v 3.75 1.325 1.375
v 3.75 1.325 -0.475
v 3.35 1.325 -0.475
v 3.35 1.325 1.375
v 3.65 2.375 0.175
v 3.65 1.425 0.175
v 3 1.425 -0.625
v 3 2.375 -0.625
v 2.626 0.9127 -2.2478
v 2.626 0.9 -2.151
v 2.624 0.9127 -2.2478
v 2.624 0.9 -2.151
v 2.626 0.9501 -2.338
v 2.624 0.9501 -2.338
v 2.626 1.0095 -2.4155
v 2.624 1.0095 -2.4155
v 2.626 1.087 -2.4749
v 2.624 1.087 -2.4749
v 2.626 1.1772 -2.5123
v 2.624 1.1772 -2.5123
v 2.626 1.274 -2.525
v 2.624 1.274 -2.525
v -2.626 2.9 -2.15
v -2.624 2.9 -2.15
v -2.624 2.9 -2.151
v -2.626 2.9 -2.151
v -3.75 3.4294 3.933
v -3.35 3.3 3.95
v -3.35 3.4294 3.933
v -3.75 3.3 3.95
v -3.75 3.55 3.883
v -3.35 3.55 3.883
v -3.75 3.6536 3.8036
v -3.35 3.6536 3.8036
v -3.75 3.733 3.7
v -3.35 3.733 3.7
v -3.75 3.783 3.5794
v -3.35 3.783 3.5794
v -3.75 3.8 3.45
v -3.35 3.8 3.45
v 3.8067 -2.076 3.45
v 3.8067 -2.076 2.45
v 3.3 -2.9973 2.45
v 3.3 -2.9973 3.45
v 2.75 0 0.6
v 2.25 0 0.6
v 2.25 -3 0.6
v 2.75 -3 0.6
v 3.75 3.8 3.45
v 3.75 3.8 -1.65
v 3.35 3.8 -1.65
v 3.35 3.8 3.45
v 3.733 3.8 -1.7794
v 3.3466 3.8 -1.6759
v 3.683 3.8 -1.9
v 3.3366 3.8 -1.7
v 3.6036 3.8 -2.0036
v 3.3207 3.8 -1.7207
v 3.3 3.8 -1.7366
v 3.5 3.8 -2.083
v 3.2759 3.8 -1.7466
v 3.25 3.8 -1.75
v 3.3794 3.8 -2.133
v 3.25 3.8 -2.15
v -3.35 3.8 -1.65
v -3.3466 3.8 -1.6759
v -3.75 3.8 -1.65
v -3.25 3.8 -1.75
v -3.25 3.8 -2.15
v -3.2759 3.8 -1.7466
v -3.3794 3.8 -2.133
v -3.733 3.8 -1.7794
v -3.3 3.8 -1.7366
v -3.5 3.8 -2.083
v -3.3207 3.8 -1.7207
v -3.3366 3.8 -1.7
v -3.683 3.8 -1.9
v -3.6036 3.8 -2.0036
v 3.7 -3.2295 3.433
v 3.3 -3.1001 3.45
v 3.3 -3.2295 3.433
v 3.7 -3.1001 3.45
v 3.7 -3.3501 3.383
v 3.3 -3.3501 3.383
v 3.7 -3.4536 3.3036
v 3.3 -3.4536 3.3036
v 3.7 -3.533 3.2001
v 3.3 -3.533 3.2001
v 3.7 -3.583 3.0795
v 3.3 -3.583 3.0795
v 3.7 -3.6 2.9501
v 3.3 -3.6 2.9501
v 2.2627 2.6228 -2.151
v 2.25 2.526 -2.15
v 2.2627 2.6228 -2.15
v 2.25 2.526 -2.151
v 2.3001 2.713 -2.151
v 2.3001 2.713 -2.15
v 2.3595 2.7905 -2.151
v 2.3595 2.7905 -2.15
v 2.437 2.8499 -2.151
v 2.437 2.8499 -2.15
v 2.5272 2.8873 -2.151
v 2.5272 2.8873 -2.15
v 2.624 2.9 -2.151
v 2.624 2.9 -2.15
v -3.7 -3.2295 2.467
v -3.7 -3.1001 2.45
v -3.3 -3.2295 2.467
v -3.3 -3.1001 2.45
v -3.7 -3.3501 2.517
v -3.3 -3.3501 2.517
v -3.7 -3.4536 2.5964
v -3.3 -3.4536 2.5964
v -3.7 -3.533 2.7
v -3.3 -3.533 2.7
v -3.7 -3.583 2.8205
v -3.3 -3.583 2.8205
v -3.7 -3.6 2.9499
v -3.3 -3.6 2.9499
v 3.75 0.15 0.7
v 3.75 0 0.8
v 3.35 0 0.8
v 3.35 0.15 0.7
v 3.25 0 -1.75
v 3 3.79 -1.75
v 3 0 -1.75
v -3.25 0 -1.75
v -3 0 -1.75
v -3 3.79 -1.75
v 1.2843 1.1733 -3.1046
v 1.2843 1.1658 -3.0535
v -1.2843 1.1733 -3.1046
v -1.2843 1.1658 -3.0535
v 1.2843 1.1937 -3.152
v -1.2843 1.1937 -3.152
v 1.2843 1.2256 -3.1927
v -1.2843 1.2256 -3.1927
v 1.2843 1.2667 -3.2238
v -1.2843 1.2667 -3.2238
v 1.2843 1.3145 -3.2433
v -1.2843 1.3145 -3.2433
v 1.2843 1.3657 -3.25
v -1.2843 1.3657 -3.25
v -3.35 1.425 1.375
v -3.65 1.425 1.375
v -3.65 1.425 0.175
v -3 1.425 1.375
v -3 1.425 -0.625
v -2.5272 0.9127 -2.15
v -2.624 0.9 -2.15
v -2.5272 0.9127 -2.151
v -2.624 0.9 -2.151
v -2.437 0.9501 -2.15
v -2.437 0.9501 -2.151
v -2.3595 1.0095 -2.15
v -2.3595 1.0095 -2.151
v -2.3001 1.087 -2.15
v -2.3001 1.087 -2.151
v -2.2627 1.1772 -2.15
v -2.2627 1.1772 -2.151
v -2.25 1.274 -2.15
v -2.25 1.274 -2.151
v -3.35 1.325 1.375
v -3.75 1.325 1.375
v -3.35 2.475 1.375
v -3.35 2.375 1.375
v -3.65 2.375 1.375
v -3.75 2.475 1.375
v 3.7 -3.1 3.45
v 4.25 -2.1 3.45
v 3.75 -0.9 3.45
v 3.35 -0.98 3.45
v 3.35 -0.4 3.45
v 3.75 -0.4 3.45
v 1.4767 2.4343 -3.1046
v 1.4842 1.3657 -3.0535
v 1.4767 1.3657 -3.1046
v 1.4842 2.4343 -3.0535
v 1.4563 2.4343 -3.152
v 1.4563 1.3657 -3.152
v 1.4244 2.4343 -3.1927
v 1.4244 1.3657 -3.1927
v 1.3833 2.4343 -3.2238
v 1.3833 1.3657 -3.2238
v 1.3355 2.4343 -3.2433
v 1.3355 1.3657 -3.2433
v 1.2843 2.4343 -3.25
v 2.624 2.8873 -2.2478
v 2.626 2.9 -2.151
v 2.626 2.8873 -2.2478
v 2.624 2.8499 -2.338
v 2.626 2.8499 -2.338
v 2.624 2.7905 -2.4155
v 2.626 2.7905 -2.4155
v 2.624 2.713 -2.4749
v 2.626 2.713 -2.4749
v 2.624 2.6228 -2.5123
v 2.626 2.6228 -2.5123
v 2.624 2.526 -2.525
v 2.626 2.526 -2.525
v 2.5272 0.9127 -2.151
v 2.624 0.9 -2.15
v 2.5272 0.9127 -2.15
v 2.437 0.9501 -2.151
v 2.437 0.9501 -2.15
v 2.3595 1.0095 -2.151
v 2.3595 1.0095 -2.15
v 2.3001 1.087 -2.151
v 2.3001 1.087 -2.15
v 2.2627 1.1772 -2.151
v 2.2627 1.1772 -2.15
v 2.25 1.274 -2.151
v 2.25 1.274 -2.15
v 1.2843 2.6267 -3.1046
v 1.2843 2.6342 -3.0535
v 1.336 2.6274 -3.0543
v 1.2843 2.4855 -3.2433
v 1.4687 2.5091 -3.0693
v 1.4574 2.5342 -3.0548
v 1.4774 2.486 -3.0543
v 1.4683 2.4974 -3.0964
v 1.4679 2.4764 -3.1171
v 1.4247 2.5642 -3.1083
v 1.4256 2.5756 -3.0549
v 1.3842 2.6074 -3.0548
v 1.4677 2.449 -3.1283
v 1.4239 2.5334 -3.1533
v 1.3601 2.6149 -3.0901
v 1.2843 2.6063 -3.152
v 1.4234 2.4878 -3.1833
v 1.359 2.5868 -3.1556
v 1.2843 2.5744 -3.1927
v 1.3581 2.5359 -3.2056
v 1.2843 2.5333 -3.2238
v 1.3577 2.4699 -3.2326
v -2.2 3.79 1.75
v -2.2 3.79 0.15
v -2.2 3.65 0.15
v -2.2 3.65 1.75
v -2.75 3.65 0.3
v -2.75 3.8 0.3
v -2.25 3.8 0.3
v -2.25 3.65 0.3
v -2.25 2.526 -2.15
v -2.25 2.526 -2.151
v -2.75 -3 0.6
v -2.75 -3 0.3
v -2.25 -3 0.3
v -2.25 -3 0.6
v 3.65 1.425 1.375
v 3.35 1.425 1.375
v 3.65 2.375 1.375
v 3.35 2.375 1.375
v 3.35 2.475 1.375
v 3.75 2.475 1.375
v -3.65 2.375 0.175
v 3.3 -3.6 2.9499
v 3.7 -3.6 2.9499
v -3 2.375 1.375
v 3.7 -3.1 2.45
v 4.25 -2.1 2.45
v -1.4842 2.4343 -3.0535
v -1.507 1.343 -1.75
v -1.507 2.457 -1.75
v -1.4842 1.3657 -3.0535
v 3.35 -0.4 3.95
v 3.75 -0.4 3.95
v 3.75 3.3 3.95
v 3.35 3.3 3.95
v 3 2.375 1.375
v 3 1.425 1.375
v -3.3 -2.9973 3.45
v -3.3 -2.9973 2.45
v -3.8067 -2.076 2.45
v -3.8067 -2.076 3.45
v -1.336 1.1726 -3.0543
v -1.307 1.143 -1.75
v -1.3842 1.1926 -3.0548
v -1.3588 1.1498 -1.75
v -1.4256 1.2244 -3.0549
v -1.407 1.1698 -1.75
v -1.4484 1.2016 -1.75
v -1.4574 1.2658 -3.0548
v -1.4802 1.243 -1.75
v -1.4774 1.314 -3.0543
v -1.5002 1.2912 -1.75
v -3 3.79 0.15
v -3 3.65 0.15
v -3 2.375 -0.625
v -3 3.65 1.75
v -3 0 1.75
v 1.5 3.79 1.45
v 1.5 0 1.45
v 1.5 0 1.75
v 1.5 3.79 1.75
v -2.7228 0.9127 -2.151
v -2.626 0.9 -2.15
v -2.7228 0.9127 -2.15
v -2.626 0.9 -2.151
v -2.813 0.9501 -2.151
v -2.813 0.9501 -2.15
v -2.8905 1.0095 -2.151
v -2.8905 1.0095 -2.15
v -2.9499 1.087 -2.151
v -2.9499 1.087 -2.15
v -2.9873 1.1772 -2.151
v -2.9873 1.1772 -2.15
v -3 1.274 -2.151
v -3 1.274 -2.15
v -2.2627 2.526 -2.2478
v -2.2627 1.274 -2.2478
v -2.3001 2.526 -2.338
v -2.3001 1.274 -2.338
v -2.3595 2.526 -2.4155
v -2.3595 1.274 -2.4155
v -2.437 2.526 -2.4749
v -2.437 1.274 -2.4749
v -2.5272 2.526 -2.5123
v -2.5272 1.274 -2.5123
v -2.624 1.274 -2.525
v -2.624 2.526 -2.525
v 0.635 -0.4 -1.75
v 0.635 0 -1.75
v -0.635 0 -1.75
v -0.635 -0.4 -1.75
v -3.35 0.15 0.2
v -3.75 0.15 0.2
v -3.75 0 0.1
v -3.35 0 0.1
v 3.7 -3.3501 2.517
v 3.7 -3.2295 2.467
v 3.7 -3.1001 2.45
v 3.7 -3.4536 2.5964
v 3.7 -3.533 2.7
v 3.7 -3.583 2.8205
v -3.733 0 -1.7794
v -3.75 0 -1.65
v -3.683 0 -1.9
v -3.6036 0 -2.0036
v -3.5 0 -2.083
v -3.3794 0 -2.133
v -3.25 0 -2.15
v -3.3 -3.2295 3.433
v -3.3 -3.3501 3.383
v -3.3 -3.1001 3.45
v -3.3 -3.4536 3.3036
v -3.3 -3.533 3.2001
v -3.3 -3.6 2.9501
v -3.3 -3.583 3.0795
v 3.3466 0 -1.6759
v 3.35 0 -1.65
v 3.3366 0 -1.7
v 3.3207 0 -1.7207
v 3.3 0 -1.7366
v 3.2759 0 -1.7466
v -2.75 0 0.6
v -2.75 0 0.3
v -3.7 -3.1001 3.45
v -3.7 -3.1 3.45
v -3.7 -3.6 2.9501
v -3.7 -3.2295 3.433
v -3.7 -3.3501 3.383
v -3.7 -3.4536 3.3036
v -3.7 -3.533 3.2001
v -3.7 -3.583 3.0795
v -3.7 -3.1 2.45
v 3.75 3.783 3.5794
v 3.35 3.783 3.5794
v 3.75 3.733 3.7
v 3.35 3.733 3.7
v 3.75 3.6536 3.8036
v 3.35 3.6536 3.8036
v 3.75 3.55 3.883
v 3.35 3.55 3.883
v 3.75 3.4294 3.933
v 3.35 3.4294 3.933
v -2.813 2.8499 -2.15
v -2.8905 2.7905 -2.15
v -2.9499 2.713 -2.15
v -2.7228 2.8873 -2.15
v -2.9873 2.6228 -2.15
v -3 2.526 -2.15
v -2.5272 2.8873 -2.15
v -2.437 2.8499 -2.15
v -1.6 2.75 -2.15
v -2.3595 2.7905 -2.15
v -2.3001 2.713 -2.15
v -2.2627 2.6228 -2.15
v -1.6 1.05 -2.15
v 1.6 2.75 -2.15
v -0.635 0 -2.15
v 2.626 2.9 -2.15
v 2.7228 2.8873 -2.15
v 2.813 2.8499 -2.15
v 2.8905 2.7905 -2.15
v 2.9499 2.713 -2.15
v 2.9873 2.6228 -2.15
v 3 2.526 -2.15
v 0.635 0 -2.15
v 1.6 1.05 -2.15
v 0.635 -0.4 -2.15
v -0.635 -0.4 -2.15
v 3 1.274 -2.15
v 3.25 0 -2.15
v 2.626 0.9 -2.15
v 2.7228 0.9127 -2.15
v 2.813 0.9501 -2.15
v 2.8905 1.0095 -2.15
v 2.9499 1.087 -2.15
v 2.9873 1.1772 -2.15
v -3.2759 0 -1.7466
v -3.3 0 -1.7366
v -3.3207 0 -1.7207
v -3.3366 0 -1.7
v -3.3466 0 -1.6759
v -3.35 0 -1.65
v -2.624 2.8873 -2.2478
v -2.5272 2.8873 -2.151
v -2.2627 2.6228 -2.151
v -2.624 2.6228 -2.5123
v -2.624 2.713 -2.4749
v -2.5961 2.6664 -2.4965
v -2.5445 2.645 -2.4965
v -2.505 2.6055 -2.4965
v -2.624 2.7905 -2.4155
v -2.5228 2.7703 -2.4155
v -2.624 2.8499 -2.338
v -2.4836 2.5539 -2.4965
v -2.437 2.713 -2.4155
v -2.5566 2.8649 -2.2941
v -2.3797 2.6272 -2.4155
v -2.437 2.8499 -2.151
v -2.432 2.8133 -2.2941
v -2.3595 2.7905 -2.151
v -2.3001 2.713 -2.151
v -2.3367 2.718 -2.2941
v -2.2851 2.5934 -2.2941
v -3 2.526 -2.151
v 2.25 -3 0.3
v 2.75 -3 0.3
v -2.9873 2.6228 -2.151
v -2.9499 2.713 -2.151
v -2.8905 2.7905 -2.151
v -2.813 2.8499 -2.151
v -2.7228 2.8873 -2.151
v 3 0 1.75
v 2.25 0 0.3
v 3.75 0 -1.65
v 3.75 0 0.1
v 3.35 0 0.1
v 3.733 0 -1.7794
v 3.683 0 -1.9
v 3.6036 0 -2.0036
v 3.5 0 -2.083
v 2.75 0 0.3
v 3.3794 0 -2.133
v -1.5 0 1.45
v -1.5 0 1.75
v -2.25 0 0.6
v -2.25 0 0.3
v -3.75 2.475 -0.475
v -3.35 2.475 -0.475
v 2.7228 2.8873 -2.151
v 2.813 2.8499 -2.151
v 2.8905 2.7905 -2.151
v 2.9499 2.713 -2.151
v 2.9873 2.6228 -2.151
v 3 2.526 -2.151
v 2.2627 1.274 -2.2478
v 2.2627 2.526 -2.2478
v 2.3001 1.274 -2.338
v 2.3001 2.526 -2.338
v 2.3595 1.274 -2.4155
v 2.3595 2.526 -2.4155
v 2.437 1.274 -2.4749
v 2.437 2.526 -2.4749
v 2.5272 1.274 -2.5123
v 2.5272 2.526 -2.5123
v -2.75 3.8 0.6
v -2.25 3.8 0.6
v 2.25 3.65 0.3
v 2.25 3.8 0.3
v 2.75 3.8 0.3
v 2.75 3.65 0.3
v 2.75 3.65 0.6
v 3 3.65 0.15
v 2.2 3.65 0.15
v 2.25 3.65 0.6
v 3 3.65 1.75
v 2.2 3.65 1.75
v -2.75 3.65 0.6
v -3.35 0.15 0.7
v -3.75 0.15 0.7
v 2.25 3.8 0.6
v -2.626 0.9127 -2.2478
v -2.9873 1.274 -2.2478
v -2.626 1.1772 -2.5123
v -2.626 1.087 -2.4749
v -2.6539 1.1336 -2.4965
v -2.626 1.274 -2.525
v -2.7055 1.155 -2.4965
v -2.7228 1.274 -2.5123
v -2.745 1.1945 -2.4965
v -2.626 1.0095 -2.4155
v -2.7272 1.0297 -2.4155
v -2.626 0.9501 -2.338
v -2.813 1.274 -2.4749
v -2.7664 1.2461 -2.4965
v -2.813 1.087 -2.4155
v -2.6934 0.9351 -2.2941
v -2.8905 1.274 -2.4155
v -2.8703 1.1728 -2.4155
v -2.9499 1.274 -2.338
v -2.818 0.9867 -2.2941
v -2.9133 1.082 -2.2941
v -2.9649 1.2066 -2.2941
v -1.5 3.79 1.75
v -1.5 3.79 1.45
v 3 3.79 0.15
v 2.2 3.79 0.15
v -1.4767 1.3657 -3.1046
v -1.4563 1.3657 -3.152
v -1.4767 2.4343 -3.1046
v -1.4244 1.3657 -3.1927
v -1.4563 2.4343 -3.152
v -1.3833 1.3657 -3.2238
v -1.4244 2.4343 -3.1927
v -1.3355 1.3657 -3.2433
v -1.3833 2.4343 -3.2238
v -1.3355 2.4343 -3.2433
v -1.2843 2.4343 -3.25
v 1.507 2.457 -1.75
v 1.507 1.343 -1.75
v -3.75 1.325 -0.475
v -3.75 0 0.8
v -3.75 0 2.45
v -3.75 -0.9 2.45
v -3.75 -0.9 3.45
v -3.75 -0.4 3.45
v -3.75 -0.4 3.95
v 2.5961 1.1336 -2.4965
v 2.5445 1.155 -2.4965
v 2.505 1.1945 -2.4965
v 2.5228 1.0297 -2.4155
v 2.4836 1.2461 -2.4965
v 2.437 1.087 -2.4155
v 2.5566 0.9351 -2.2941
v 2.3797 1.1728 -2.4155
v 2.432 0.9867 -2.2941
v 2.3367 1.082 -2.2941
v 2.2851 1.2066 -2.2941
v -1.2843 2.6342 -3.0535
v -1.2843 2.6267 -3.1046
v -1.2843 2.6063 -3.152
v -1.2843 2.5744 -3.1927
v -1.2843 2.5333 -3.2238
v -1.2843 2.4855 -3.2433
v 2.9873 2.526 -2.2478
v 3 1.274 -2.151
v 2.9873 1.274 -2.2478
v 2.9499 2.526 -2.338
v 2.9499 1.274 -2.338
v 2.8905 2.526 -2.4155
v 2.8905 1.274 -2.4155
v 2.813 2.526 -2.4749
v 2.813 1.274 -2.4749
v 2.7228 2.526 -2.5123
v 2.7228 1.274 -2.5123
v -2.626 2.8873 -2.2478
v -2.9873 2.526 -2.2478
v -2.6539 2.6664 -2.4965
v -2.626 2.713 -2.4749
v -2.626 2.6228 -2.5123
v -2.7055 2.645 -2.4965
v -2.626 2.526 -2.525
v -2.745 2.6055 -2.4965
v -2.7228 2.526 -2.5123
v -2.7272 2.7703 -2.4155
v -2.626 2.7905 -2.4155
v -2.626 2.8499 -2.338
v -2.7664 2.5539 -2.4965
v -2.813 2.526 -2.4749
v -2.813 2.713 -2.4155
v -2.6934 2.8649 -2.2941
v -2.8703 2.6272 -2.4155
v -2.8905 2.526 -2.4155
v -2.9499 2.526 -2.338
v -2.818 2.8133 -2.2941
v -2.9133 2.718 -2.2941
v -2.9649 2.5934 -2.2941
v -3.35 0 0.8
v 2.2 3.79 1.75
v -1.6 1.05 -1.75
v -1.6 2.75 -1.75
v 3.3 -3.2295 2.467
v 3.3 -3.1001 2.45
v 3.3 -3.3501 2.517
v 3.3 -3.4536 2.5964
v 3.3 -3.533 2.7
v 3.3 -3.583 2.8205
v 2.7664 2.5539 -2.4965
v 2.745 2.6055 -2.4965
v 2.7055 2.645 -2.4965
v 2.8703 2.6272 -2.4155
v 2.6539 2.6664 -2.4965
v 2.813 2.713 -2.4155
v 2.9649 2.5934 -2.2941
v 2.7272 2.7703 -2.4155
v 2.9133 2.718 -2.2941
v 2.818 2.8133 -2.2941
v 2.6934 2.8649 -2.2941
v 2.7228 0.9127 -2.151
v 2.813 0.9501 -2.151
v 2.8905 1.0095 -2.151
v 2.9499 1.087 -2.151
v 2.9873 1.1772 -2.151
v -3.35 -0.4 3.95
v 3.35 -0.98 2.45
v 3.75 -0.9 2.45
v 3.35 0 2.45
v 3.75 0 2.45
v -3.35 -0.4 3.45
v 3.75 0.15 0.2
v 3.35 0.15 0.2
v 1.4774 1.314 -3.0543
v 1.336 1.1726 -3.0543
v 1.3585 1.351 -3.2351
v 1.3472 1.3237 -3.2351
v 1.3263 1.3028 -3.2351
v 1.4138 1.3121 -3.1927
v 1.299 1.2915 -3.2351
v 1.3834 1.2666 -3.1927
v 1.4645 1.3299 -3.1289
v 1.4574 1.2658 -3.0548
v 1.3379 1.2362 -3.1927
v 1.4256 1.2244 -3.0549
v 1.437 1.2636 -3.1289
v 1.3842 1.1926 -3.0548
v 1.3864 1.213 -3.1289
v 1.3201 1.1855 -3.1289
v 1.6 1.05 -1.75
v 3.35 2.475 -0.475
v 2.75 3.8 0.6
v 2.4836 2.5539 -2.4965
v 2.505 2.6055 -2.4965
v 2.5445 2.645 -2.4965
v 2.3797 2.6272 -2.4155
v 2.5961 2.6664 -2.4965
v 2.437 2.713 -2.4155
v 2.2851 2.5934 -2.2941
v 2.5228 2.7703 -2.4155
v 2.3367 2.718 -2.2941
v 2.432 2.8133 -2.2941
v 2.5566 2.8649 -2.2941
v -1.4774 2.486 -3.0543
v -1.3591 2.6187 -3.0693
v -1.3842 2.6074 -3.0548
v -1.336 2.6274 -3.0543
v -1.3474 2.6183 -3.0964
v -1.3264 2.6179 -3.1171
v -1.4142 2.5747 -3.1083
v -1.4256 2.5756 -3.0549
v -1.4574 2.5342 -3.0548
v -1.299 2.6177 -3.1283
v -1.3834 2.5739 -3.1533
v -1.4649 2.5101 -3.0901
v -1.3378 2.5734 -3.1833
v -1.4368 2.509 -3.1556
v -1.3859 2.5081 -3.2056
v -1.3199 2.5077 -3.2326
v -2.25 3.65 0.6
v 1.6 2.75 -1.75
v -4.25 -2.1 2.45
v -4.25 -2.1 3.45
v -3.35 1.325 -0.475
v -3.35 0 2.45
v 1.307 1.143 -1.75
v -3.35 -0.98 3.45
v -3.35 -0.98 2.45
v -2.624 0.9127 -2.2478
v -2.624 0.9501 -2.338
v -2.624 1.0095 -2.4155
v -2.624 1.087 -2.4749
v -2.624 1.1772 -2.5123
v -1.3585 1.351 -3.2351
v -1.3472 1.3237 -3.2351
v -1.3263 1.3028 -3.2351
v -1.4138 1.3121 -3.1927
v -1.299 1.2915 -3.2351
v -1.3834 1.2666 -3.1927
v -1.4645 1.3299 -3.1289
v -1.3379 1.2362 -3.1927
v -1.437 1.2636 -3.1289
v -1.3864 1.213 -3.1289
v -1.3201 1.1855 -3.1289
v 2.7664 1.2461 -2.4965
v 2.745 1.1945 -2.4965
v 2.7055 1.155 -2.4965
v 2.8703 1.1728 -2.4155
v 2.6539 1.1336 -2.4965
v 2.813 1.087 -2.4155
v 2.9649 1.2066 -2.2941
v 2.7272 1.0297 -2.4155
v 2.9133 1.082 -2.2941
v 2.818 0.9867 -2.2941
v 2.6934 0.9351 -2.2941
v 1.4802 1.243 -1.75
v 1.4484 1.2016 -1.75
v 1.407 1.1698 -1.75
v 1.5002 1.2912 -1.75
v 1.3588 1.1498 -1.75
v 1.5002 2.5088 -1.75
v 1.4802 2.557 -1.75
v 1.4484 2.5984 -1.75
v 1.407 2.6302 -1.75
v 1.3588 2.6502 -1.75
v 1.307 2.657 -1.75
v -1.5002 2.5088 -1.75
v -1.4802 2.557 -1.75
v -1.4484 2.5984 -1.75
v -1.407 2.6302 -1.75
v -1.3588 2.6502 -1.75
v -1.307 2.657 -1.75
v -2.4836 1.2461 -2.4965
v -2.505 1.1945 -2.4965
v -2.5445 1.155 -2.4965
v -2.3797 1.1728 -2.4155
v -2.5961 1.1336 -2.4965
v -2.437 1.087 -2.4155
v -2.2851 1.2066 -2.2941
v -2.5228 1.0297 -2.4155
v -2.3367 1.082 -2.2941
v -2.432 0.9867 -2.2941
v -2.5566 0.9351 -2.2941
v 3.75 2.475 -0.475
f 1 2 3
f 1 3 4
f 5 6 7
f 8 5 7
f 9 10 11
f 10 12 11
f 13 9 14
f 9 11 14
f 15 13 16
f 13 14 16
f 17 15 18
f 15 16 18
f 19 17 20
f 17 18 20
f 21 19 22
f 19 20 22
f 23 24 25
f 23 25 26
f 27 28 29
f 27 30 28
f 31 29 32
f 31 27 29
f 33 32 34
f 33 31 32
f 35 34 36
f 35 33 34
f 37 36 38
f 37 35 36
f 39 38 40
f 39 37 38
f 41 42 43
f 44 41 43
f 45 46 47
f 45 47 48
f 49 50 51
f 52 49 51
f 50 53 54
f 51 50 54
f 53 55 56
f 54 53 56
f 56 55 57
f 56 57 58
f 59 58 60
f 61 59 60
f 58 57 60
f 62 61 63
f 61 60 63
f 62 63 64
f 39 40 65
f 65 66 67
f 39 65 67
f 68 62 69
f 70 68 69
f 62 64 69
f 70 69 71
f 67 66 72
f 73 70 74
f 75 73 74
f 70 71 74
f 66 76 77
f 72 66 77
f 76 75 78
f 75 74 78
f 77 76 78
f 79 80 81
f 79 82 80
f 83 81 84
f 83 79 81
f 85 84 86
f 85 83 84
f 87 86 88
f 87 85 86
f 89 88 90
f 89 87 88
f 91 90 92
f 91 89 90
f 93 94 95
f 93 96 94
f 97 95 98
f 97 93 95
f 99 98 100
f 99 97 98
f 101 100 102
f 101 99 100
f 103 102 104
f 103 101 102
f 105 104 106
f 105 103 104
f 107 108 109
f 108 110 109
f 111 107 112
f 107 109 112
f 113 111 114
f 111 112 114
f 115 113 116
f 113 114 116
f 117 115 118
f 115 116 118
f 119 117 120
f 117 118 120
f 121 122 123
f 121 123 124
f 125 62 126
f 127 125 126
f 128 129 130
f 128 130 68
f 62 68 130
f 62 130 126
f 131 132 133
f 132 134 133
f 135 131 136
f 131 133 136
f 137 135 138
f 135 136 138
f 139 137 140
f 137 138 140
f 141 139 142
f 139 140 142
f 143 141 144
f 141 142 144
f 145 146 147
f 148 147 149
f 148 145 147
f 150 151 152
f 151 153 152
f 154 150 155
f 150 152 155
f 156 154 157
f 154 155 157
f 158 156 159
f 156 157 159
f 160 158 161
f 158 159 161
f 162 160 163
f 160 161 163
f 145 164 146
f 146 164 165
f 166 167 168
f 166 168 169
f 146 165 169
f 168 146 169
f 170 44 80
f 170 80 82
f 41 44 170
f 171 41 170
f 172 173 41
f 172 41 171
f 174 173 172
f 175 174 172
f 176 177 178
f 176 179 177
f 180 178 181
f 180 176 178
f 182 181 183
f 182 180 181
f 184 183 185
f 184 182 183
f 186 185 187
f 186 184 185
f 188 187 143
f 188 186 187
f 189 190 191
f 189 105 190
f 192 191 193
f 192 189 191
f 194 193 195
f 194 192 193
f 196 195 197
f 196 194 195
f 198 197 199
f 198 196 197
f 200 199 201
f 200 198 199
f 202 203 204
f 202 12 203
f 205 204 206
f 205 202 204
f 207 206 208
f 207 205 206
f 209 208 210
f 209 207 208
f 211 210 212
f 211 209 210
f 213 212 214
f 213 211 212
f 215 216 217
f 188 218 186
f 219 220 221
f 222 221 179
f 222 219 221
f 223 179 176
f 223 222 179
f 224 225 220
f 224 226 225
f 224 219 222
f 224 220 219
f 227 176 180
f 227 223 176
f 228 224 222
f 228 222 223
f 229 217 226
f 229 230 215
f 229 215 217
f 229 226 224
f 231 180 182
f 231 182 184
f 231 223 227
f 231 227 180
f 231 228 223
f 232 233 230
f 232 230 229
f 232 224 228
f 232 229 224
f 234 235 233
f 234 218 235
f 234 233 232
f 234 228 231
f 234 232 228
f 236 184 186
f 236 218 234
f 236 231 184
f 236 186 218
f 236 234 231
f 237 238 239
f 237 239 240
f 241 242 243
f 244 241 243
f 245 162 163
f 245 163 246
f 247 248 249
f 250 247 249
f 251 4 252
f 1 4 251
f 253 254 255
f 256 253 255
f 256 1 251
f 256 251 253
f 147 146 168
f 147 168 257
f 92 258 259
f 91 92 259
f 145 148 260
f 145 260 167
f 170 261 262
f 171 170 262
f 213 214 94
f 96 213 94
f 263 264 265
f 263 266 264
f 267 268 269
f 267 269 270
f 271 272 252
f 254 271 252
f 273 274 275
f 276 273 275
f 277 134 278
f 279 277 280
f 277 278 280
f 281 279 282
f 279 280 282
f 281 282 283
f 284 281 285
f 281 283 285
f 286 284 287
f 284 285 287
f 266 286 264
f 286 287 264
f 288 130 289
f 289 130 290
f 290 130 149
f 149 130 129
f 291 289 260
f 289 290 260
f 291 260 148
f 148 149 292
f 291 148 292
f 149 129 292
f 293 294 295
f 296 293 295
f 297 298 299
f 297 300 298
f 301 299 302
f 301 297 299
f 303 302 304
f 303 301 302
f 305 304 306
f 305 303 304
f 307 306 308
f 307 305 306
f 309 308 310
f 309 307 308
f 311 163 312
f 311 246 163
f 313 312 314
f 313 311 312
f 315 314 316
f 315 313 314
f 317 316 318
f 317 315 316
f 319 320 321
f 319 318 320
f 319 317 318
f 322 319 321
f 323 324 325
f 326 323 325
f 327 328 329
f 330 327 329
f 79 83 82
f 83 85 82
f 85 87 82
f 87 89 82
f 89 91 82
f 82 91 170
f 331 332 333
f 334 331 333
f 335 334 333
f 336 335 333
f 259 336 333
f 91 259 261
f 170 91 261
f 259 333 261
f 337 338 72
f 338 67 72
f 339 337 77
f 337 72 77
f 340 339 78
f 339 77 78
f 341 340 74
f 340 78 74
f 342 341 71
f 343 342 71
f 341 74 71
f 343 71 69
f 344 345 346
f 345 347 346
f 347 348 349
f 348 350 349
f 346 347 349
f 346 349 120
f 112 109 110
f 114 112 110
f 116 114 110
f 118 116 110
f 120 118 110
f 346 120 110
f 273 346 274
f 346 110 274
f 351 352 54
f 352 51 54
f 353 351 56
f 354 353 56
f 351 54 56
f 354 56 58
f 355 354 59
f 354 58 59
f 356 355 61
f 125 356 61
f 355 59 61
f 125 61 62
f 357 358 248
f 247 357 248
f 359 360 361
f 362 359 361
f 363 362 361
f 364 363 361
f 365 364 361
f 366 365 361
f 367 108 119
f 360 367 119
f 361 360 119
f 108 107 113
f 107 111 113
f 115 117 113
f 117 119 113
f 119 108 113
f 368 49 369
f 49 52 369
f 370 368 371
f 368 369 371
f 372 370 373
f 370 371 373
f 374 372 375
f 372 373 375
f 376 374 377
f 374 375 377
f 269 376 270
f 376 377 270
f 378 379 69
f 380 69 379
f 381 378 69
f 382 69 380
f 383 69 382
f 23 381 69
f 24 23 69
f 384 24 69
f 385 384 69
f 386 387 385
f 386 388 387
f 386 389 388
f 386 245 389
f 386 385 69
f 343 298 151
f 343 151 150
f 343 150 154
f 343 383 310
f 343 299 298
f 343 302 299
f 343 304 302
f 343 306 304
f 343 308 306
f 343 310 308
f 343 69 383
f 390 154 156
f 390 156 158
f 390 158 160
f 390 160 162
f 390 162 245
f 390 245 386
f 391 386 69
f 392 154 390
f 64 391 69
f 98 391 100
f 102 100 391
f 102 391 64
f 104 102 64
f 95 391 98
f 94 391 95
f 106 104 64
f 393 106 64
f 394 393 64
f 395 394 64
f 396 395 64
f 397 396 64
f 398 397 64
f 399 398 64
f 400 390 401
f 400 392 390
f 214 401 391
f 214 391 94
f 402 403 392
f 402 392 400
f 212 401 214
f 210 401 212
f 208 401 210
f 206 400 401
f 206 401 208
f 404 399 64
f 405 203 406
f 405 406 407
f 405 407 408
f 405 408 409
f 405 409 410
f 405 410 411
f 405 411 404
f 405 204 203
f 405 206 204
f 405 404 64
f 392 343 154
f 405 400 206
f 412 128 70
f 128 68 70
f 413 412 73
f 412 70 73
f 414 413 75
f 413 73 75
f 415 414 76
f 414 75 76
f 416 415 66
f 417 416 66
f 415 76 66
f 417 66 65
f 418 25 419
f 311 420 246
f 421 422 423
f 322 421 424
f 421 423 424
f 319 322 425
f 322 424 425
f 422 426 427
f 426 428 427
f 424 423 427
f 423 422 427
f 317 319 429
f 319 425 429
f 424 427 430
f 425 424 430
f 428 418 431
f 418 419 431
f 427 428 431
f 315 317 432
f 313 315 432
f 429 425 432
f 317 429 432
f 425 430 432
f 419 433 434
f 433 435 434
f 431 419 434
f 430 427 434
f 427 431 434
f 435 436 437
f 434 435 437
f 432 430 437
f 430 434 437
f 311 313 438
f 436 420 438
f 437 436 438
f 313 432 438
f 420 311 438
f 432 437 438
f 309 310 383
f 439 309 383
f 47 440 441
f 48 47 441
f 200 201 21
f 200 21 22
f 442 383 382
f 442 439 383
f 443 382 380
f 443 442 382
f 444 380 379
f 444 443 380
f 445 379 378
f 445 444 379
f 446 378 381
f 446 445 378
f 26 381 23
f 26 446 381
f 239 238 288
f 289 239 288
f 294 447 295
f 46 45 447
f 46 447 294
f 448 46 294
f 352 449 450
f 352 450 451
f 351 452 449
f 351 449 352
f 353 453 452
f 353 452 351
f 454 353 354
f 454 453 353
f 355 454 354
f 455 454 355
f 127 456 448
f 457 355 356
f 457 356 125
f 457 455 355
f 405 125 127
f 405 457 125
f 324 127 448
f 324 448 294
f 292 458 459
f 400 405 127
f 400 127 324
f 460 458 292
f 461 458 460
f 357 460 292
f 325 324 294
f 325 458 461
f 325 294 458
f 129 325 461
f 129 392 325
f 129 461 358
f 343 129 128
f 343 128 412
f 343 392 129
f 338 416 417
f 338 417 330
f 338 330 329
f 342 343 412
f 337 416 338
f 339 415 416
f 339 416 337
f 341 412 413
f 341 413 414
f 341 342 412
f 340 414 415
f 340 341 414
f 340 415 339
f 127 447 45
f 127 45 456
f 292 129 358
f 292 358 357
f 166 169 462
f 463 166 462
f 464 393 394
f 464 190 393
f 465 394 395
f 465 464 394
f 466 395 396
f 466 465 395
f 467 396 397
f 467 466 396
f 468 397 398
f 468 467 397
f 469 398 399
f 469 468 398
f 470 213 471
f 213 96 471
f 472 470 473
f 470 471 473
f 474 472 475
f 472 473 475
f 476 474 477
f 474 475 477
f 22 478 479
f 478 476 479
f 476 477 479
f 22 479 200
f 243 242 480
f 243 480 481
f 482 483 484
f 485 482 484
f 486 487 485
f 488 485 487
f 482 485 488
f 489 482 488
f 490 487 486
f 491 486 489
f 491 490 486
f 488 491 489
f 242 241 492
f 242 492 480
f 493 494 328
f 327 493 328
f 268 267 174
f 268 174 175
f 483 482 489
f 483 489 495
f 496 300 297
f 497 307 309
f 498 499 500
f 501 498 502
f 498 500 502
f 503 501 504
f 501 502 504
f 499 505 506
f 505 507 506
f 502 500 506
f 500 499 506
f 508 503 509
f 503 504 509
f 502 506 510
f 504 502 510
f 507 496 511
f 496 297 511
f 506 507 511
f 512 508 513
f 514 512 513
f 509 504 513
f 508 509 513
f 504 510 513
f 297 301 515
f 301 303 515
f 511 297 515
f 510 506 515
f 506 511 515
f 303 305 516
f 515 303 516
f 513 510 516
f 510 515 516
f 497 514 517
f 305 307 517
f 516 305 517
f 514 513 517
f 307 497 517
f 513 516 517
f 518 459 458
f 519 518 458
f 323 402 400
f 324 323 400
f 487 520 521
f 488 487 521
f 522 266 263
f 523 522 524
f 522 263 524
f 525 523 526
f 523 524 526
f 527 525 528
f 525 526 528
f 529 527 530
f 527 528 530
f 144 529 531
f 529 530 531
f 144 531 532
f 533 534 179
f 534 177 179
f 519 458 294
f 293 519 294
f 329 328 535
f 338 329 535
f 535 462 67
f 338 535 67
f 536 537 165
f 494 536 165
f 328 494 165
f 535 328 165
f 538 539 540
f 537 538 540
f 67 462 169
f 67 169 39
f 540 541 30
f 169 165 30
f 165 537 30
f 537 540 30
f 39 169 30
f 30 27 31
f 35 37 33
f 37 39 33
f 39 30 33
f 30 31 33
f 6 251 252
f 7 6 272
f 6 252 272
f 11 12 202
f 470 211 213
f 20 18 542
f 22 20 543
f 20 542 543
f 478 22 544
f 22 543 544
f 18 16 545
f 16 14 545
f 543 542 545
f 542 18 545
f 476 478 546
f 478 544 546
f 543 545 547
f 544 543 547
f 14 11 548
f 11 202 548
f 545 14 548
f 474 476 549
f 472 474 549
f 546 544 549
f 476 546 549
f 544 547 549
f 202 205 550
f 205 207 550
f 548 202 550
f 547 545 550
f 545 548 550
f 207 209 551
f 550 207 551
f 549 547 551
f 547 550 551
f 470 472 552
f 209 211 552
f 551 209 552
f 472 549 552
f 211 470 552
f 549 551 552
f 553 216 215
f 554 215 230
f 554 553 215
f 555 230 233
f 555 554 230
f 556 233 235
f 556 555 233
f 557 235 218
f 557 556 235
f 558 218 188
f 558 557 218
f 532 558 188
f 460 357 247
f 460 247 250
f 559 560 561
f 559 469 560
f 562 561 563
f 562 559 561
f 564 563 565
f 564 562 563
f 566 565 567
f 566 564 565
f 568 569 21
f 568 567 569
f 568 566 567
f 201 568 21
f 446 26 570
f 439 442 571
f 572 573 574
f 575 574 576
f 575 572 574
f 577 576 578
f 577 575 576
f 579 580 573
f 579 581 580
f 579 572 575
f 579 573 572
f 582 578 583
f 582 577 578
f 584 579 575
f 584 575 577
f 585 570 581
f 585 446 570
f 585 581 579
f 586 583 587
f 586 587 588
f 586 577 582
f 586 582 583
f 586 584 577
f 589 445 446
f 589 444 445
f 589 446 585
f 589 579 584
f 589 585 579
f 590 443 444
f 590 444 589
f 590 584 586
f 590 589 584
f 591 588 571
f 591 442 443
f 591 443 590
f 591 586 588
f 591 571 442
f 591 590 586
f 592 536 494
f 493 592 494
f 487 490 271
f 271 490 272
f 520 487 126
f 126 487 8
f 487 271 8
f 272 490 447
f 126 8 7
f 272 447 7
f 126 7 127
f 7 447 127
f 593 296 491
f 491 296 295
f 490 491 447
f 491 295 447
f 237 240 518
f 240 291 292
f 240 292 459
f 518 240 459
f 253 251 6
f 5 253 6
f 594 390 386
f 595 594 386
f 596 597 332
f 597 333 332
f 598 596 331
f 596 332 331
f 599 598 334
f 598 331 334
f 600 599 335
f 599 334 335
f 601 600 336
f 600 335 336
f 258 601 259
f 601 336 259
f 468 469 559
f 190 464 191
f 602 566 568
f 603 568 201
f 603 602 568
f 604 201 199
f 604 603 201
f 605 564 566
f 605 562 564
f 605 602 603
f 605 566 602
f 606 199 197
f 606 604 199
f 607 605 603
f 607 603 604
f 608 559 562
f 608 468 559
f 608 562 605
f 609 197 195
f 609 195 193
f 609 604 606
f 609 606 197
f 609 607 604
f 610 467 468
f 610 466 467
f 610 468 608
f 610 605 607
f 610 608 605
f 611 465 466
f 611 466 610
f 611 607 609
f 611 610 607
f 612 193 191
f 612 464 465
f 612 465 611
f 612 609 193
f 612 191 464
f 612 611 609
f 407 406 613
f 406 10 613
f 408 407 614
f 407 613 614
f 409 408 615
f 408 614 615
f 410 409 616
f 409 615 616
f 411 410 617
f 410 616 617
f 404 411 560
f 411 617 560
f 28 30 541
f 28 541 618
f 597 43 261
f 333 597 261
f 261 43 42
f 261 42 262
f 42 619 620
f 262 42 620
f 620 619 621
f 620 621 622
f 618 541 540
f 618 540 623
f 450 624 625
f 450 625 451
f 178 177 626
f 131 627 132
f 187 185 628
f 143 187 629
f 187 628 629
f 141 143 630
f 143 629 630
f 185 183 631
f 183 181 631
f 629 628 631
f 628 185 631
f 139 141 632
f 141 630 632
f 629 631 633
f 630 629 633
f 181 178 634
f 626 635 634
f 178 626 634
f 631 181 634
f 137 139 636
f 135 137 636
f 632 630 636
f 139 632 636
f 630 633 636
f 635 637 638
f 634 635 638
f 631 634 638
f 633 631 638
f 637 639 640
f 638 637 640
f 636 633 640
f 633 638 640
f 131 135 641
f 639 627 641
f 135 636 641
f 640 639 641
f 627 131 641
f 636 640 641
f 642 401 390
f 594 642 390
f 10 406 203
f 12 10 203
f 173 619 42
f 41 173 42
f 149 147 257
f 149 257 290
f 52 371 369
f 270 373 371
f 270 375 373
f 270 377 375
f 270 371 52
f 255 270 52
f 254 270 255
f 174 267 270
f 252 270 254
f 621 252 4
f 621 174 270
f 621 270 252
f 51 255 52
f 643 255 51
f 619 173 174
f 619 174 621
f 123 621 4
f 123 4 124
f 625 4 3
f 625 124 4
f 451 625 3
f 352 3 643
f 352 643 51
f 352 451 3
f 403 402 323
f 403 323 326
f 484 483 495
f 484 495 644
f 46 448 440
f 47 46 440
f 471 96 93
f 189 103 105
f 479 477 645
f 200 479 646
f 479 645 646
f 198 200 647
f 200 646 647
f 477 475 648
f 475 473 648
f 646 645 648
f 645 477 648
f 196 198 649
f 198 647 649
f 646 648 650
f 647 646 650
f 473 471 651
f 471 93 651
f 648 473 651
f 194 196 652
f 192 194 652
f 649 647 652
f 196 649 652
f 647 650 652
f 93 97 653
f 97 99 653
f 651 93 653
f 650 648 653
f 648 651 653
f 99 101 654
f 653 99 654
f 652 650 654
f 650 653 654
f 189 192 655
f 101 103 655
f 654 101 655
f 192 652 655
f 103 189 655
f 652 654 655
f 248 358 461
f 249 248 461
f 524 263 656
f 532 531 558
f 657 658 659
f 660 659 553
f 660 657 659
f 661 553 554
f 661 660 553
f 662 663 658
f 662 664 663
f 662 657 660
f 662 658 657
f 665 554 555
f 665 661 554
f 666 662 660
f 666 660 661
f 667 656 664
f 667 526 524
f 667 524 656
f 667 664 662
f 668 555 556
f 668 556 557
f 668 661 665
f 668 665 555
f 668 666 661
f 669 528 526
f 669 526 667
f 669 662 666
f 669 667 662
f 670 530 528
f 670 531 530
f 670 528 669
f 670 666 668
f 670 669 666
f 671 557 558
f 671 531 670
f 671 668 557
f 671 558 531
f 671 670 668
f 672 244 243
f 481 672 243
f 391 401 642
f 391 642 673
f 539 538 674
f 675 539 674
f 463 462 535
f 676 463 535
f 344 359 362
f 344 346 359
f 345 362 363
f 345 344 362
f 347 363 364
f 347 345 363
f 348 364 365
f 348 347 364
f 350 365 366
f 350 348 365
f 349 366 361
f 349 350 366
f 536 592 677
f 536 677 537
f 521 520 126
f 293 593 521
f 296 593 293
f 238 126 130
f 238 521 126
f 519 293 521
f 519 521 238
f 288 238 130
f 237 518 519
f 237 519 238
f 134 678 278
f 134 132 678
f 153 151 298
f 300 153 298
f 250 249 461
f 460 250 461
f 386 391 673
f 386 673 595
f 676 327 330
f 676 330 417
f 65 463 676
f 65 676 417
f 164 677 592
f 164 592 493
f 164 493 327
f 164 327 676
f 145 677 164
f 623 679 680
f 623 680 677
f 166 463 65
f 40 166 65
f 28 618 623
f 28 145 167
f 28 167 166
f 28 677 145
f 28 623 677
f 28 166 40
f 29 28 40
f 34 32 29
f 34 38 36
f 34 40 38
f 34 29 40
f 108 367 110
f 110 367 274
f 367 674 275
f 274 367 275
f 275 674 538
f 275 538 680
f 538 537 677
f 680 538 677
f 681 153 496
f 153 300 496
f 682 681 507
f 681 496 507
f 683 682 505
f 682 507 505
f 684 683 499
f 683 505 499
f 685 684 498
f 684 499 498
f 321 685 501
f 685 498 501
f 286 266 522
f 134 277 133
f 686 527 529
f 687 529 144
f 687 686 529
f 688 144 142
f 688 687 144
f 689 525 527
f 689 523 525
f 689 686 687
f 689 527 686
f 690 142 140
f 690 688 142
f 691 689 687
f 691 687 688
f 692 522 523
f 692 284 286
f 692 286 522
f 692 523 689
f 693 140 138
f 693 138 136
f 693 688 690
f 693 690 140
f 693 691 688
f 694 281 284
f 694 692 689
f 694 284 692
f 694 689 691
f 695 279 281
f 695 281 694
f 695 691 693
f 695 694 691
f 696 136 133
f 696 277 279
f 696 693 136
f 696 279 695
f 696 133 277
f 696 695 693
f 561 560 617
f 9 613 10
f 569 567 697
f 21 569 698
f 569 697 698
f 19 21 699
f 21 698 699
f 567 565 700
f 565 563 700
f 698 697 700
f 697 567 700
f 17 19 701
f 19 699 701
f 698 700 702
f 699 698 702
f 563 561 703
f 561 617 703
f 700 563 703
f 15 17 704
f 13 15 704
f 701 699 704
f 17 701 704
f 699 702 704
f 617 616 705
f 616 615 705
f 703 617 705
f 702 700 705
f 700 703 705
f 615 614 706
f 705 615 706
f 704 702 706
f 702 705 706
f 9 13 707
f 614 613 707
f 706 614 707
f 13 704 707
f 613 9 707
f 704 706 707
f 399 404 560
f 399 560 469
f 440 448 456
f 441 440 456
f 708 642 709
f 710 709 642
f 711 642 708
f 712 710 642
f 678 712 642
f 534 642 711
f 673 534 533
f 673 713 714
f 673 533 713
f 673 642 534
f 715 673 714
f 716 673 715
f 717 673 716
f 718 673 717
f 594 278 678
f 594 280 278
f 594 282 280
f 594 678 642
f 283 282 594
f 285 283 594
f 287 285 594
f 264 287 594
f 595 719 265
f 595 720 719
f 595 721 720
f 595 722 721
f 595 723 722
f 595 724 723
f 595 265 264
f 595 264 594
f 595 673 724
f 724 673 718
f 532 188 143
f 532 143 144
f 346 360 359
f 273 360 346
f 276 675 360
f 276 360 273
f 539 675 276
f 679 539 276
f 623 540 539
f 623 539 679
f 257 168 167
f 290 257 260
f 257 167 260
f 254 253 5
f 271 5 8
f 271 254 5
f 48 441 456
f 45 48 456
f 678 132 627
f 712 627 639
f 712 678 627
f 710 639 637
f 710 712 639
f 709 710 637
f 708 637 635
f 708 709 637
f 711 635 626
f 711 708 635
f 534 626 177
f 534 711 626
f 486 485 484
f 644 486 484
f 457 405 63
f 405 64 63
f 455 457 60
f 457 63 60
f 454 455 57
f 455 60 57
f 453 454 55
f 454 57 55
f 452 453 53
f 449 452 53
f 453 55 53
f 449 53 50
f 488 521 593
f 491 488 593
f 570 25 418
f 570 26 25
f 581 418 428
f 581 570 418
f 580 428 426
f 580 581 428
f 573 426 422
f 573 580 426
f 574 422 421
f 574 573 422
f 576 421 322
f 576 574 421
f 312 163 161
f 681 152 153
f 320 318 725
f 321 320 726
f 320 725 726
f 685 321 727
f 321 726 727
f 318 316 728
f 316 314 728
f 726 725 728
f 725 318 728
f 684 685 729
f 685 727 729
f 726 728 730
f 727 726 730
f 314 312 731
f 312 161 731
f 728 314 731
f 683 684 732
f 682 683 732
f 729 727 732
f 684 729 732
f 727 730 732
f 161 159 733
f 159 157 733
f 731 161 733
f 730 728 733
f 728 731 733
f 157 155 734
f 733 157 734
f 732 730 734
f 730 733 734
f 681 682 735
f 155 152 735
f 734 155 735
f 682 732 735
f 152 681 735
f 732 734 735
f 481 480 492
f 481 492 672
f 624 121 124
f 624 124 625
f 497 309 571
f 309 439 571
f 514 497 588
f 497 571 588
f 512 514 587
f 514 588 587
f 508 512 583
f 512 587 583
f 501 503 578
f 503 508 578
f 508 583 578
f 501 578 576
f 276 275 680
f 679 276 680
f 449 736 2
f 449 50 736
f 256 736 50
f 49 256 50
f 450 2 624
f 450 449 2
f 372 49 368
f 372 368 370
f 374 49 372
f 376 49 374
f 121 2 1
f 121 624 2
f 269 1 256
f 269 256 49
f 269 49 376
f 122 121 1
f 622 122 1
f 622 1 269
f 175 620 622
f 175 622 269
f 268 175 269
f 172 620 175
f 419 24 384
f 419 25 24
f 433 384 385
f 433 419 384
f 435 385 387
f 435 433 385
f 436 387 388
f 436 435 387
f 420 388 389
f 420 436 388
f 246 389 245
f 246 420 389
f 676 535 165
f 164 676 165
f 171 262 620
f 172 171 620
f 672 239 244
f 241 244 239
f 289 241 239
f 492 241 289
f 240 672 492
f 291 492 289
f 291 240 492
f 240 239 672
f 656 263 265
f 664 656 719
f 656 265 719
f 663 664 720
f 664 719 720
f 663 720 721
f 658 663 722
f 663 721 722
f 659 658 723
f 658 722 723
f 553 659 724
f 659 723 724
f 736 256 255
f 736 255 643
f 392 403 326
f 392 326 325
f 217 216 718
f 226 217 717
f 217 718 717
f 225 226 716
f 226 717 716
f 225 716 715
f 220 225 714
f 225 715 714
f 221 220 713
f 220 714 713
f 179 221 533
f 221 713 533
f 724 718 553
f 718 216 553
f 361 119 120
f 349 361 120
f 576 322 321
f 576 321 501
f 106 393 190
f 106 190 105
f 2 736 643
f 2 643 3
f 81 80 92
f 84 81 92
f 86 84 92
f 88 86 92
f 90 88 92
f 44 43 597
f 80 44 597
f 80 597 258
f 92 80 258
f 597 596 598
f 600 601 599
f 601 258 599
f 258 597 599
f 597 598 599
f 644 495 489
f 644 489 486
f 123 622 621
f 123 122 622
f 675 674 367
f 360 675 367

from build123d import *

# Parameters (mm, degrees)
EXTRUDE1_DEPTH      = 3.8
EXTRUDE_THIN1_DEPTH = 3.8
SKETCH3_W           = 0.8
SKETCH3_H           = 1.6
CUT_EXTRUDE1_DEPTH  = 0.15
FILLET1_R           = 0.5
SKETCH9_W           = 3.2
SKETCH9_H           = 1.7
SKETCH9_W_2         = 3
SKETCH9_H_2         = 1.5
CUT_EXTRUDE5_DEPTH  = 0.4
SKETCH11_W          = 6
SKETCH11_H          = 3.5
CUT_EXTRUDE6_DEPTH  = 0.01
FILLET6_R           = 0.1
EXTRUDE2_OUTLINE_W  = 2.961598858
EXTRUDE2_OUTLINE_H  = 1.461598858
EXTRUDE2_DEPTH      = 1.5
EXTRUDE2_DRAFT      = 1
FILLET7_R           = 0.2
SKETCH13_W          = 1.27
SKETCH13_H          = 0.4
EXTRUDE3_DEPTH      = 0.4
CUT_EXTRUDE7_DEPTH  = 0.4
CUT_EXTRUDE8_START  = -9.5
CUT_EXTRUDE8_DEPTH  = 2.4
EXTRUDE4_START      = 0.1
EXTRUDE4_DEPTH      = 0.95
SKETCH16_W          = 0.75
SKETCH16_H          = 2
EXTRUDE5_DEPTH      = 0.375
FILLET8_R           = 0.374
EXTRUDE6_DEPTH      = 0.5
EXTRUDE6_DEPTH_BACK = 0.5
EXTRUDE6_START      = -1
SKETCH17_W          = 0.4
SKETCH17_H          = 0.4
FILLET9_R           = 0.5
SKETCH17_3_W        = 0.4
SKETCH17_3_H        = 0.4
EXTRUDE7_DEPTH      = 0.5
EXTRUDE8_DEPTH      = 0.15
EXTRUDE8_DEPTH_BACK = 0.15
EXTRUDE8_START      = -3.5
SKETCH18_W          = 0.5
SKETCH18_H          = 0.15


# Read off the part's stored shape, not the designer's step: Extrude2
with BuildPart() as part:
    # Sketch1 → Extrude1 (new body)
    with BuildSketch(Plane(origin=(0, 0, 0), x_dir=(1, 0, 0), z_dir=(0, 1, 0))):
        Polygon((-1.5, -1.75), (-1.5, -1.45), (1.5, -1.45), (1.5, -1.75), (3, -1.75), (3, 1.75), (-3, 1.75), (-3, -1.75), align=None)
    extrude(amount=EXTRUDE1_DEPTH)

    # Sketch2 → Extrude-Thin1 (add)
    with BuildSketch(Plane(origin=(0, 0, 0), x_dir=(1, 0, 0), z_dir=(0, 1, 0))):
        Polygon((-3.75, -3.95), (-3.75, 2.15), (3.75, 2.15), (3.75, -3.95), (3.35, -3.95), (3.35, 1.75), (-3.35, 1.75), (-3.35, -3.95), align=None)
    extrude(amount=EXTRUDE_THIN1_DEPTH)

    # Sketch3 → Cut-Extrude1 (cut)
    with BuildSketch(Plane(origin=(0, 3.8, 0), x_dir=(-1, 0, 0), z_dir=(0, 1, 0))):
        with Locations((2.6, 0.95)):
            Rectangle(SKETCH3_W, SKETCH3_H)
        with Locations((-2.6, 0.95)):
            Rectangle(SKETCH3_W, SKETCH3_H)
    extrude(amount=-CUT_EXTRUDE1_DEPTH, mode=Mode.SUBTRACT)

    # Fillet1
    fillet1_edges = [part.edges().sort_by_distance(p)[0] for p in [
        (3.55, 3.8, 3.95),
        (3.75, 1.9, -2.15),
        (-3.75, 1.9, -2.15),
        (-3.55, 3.8, 3.95),
    ]]
    fillet(fillet1_edges, radius=FILLET1_R)

    # Sketch9 → Cut-Extrude5 (cut)
    # profile 1 of 2: a face of its own
    with BuildSketch(Plane(origin=(0, 0, -2.15), x_dir=(-1, 0, 0), z_dir=(0, 0, -1))):
        with Locations((0, 1.9)):
            Rectangle(SKETCH9_W, SKETCH9_H)
        with Locations((0, 1.9)):
            Rectangle(SKETCH9_W_2, SKETCH9_H_2, mode=Mode.SUBTRACT)
    # profile 2 of 2: a face of its own
    with BuildSketch(Plane(origin=(0, 0, -2.15), x_dir=(-1, 0, 0), z_dir=(0, 0, -1))):
        with Locations((0, 1.9)):
            Rectangle(SKETCH9_W_2, SKETCH9_H_2)
    extrude(amount=-CUT_EXTRUDE5_DEPTH, mode=Mode.SUBTRACT)

    # Sketch11 → Cut-Extrude6 (cut)
    with BuildSketch(Plane(origin=(0, 3.8, 0), x_dir=(-1, 0, 0), z_dir=(0, 1, 0))):
        Rectangle(SKETCH11_W, SKETCH11_H)
    extrude(amount=-CUT_EXTRUDE6_DEPTH, mode=Mode.SUBTRACT)

    # Fillet6
    fillet6_edges = [part.edges().sort_by_distance(p)[0] for p in [
        (-3.35, 1.9, -1.75),
        (3.35, 1.9, -1.75),
    ]]
    fillet(fillet6_edges, radius=FILLET6_R)


with BuildPart() as extrude2_tool:
    # Extrude2 outline → Extrude2 (with draft: the straight prism first)
    with BuildSketch(Plane(origin=(0, 0, -3.25), x_dir=(-1, 0, 0), z_dir=(0, 0, -1))):
        with Locations((0, 1.9)):
            Rectangle(EXTRUDE2_OUTLINE_W, EXTRUDE2_OUTLINE_H)
    extrude(amount=-EXTRUDE2_DEPTH)
    # Extrude2: the draft: its side faces are tilted about the plane it starts from
    extrude2_sides = [extrude2_tool.faces().sort_by_distance(p)[0] for p in [
        (-1.480799429, 1.9, -2.5),
        (0, 2.630799429, -2.5),
        (1.480799429, 1.9, -2.5),
        (0, 1.169200571, -2.5),
    ]]
    draft(extrude2_sides, Plane(origin=(0, 0, -3.25), x_dir=(-1, 0, 0), z_dir=(0, 0, -1)), EXTRUDE2_DRAFT)


with BuildPart() as part_1:
    add(part.part)

    # Extrude2: add extrude2_tool
    add(extrude2_tool.part)

    # Fillet7
    fillet7_edges = [part_1.edges().sort_by_distance(p)[0] for p in [
        (-1.493890728, 1.156109272, -2.5),
        (-1.480799429, 1.9, -3.25),
        (-1.493890728, 2.643890728, -2.5),
        (0, 2.630799429, -3.25),
        (1.493890728, 2.643890728, -2.5),
        (1.493890728, 1.156109272, -2.5),
        (1.480799429, 1.9, -3.25),
        (0, 1.169200571, -3.25),
    ]]
    fillet(fillet7_edges, radius=FILLET7_R)

    # Sketch13 → Extrude3 (add)
    with BuildSketch(Plane(origin=(0, 0, -2.15), x_dir=(-1, 0, 0), z_dir=(0, 0, -1))):
        with Locations((0, -0.2)):
            Rectangle(SKETCH13_W, SKETCH13_H)
    extrude(amount=-EXTRUDE3_DEPTH)

    # Sketch14 → Cut-Extrude7 (cut)
    with BuildSketch(Plane.ZY.offset(3.75)):
        Polygon((-0.475, 1.325), (0.45, 1.325), (1.375, 1.325), (1.375, 2.475), (-0.475, 2.475), align=None)
        Polygon((0.2, 0.15), (0.1, 0), (0.8, 0), (0.7, 0.15), align=None)
    extrude(amount=-CUT_EXTRUDE7_DEPTH, mode=Mode.SUBTRACT)

    # Sketch14<3> → Cut-Extrude8 (cut)
    with BuildSketch(Plane.ZY.offset(3.75).offset(CUT_EXTRUDE8_START)):
        Polygon((-0.475, 1.325), (0.45, 1.325), (1.375, 1.325), (1.375, 2.475), (-0.475, 2.475), align=None)
        Polygon((0.2, 0.15), (0.1, 0), (0.8, 0), (0.7, 0.15), align=None)
    extrude(amount=CUT_EXTRUDE8_DEPTH, mode=Mode.SUBTRACT)

    # Sketch15 → Extrude4 (add)
    with BuildSketch(Plane(origin=(0, 1.325, 0), x_dir=(-1, 0, 0), z_dir=(0, 1, 0)).offset(EXTRUDE4_START)):
        Polygon((3, 1.375), (3.65, 1.375), (3.65, 0.175), (3, -0.625), align=None)
        Polygon((-3, -0.625), (-3, 1.375), (-3.65, 1.375), (-3.65, 0.175), align=None)
    extrude(amount=EXTRUDE4_DEPTH)

    # Sketch16 → Extrude5 (add)
    with BuildSketch(Plane(origin=(0, 0, -2.15), x_dir=(-1, 0, 0), z_dir=(0, 0, -1))):
        with Locations((-2.625, 1.9)):
            Rectangle(SKETCH16_W, SKETCH16_H)
        with Locations((2.625, 1.9)):
            Rectangle(SKETCH16_W, SKETCH16_H)
    extrude(amount=EXTRUDE5_DEPTH)

    # Fillet8
    fillet8_edges = [part_1.edges().sort_by_distance(p)[0] for p in [
        (3, 2.9, -2.3375),
        (3, 0.9, -2.3375),
        (2.25, 0.9, -2.3375),
        (2.25, 2.9, -2.3375),
        (3, 1.9, -2.525),
        (2.625, 0.9, -2.525),
        (2.25, 1.9, -2.525),
        (2.625, 2.9, -2.525),
        (-3, 2.9, -2.3375),
        (-2.25, 2.9, -2.3375),
        (-2.25, 0.9, -2.3375),
        (-3, 0.9, -2.3375),
        (-2.625, 2.9, -2.525),
        (-2.25, 1.9, -2.525),
        (-2.625, 0.9, -2.525),
        (-3, 1.9, -2.525),
    ]]
    fillet(fillet8_edges, radius=FILLET8_R)

    # Sketch17 → Extrude6 (add, two sides: drawn at the far end of the back side and taken through both)
    with BuildSketch(Plane.XY.offset(3.95).offset(EXTRUDE6_START - EXTRUDE6_DEPTH_BACK)):
        Polygon((-3.35, -0.4), (-3.75, -0.4), (-3.75, -0.9), (-4.25, -2.1), (-3.7, -3.1), (-3.7, -3.6), (-3.5, -3.6), (-3.3, -3.6), (-3.3, -2.997257294), (-3.806677376, -2.076025702), (-3.35, -0.98), align=None)
        with Locations((-3.55, -0.2)):
            Rectangle(SKETCH17_W, SKETCH17_H)
        with Locations((3.55, -0.2)):
            Rectangle(SKETCH17_W, SKETCH17_H)
        Polygon((3.75, -0.4), (3.35, -0.4), (3.35, -0.98), (3.806677376, -2.076025702), (3.3, -2.997257294), (3.3, -3.6), (3.5, -3.6), (3.7, -3.6), (3.7, -3.1), (4.25, -2.1), (3.75, -0.9), align=None)
    extrude(amount=EXTRUDE6_DEPTH + EXTRUDE6_DEPTH_BACK)

    # Fillet9
    fillet9_edges = [part_1.edges().sort_by_distance(p)[0] for p in [
        (3.5, -3.6, 3.45),
        (3.5, -3.6, 2.45),
        (-3.5, -3.6, 3.45),
        (-3.5, -3.6, 2.45),
    ]]
    fillet(fillet9_edges, radius=FILLET9_R - 0.0001)  # a hair under: the kernel refuses the full size

    # Sketch17<3> → Extrude7 (add)
    with BuildSketch(Plane.XY.offset(3.95)):
        with Locations((-3.55, -0.2)):
            Rectangle(SKETCH17_3_W, SKETCH17_3_H)
        with Locations((3.55, -0.2)):
            Rectangle(SKETCH17_3_W, SKETCH17_3_H)
    extrude(amount=-EXTRUDE7_DEPTH)

    # Sketch18 → Extrude8 (add, two sides: drawn at the far end of the back side and taken through both)
    with BuildSketch(Plane.XY.offset(3.95).offset(EXTRUDE8_START - EXTRUDE8_DEPTH_BACK)):
        Polygon((2.75, 0), (2.25, 0), (2.25, -3), (2.5, -3), (2.75, -3), align=None)
        Polygon((-2.5, -3), (-2.25, -3), (-2.25, 0), (-2.75, 0), (-2.75, -3), align=None)
        with Locations((-2.5, 3.725)):
            Rectangle(SKETCH18_W, SKETCH18_H)
        with Locations((2.5, 3.725)):
            Rectangle(SKETCH18_W, SKETCH18_H)
    extrude(amount=EXTRUDE8_DEPTH + EXTRUDE8_DEPTH_BACK)


solid = part_1.part
